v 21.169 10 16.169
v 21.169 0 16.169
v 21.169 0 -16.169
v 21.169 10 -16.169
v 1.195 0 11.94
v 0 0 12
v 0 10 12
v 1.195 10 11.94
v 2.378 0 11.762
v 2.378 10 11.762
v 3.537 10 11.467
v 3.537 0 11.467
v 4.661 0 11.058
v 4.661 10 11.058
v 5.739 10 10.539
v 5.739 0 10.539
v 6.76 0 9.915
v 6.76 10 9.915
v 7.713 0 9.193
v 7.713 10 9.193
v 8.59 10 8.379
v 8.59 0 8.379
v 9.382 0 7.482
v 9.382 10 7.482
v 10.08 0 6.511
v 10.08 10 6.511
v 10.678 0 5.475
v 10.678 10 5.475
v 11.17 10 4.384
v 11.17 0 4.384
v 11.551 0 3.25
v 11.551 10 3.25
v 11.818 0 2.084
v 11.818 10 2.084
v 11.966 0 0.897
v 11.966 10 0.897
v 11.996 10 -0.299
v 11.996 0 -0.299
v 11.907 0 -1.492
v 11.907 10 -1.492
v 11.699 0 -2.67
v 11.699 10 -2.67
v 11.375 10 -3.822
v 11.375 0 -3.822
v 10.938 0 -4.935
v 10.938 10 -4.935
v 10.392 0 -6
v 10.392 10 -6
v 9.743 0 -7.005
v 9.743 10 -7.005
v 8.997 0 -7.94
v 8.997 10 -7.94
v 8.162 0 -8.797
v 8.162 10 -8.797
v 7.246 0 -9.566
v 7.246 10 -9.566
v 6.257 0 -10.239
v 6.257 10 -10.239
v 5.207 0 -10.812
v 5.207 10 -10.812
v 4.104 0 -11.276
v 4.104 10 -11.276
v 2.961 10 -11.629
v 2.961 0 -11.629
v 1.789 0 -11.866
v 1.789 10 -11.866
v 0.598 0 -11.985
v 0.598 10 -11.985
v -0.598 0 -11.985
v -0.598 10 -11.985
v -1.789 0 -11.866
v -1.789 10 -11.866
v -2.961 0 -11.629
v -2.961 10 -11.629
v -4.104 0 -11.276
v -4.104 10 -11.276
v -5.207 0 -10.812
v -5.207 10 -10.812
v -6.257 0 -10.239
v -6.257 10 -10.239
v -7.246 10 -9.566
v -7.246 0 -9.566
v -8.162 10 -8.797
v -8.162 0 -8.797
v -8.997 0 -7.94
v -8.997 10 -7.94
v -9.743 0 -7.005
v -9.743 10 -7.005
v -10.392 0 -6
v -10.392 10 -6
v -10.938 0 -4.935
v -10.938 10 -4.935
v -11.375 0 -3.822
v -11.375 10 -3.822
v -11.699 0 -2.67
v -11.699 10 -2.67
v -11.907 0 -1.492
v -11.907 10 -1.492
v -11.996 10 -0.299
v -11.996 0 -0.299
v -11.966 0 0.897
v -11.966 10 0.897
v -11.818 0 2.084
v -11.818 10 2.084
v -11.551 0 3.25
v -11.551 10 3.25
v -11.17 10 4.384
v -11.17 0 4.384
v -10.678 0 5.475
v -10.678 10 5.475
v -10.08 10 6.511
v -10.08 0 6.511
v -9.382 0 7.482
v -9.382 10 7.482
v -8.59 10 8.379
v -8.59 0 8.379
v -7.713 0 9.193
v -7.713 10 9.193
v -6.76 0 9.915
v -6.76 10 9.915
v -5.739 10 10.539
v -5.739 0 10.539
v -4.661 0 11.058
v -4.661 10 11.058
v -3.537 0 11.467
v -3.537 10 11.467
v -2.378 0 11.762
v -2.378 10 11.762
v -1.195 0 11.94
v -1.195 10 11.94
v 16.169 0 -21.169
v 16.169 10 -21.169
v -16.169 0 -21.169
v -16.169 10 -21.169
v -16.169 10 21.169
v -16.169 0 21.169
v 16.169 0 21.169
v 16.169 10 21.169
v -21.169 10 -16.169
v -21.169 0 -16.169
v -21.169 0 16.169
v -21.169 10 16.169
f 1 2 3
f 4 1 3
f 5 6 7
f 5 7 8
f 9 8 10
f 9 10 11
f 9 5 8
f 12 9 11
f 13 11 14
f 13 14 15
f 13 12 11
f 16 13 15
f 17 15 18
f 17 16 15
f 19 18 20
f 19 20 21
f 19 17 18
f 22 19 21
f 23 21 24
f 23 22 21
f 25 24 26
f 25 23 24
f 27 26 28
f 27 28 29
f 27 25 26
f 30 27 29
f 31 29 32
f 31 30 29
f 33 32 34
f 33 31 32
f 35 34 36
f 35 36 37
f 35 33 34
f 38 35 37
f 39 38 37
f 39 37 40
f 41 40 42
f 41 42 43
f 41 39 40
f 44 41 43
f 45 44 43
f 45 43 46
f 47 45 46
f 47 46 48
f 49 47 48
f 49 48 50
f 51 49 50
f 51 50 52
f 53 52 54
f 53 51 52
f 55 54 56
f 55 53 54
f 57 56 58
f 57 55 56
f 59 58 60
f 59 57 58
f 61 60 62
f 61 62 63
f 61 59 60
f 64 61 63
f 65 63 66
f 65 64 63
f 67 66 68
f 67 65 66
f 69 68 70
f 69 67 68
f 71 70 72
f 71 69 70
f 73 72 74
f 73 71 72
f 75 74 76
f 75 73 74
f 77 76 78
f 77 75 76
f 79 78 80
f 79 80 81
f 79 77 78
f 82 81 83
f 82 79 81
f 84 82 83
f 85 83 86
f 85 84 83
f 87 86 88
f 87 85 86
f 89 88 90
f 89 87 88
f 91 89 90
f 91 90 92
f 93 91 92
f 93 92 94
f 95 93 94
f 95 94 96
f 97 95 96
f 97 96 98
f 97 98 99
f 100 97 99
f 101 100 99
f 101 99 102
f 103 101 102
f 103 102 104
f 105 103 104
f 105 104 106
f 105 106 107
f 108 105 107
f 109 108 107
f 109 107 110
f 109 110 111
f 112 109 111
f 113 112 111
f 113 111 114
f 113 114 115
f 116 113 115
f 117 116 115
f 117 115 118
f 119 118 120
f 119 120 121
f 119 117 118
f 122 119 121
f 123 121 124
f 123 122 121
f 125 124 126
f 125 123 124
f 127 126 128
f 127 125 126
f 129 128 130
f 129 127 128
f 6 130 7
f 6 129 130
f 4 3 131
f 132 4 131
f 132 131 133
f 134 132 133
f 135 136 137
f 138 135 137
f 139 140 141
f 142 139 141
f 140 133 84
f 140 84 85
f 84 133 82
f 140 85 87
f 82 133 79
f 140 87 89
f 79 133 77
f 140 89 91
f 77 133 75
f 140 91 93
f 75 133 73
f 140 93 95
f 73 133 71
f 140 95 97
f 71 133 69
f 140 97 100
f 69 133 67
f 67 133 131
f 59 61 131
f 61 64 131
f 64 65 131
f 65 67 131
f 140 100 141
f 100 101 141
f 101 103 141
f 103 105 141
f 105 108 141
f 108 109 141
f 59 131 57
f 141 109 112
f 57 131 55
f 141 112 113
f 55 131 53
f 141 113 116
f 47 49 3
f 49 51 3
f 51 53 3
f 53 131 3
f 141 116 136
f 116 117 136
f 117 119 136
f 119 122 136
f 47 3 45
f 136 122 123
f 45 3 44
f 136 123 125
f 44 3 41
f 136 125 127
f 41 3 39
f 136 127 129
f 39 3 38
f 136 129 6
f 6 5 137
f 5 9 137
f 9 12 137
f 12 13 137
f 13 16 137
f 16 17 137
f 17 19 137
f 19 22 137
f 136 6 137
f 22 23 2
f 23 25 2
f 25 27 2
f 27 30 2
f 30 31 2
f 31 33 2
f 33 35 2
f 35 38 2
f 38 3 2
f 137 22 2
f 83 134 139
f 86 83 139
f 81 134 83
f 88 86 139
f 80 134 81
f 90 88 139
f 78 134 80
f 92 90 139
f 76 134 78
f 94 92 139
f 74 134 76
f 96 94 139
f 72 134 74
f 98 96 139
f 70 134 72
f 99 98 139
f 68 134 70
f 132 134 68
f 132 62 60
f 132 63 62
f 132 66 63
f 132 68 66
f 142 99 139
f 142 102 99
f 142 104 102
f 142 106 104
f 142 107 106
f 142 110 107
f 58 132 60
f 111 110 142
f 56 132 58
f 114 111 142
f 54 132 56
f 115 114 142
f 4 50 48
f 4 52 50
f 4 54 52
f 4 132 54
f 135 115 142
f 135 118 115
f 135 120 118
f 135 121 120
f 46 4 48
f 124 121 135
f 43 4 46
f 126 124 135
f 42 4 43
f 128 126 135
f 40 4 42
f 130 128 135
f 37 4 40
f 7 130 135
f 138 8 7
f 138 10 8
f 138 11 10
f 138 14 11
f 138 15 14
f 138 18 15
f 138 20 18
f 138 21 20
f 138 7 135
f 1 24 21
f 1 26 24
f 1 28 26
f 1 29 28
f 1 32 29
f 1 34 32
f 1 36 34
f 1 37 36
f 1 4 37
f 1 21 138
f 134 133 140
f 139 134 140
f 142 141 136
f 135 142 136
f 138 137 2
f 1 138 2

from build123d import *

# Parameters (mm, degrees)
SKETCH1_R          = 33.334829616
SKETCH1_R_2        = 12
EXTRUDE1_DEPTH     = 10
SKETCH2_W          = 68.7469374
SKETCH2_H          = 68.7469374
CUT_EXTRUDE1_DEPTH = 10


with BuildPart() as part:
    # Sketch1 → Extrude1 (new body)
    with BuildSketch(Plane(origin=(0, 0, 0), x_dir=(1, 0, 0), z_dir=(0, 1, 0))):
        with Locations(Location((0, 0, 0), (0, 0, 270))):
            Circle(SKETCH1_R)
        with Locations(Location((0, 0, 0), (0, 0, 270))):
            Circle(SKETCH1_R_2, mode=Mode.SUBTRACT)
    extrude(amount=EXTRUDE1_DEPTH)

    # Sketch2 → Cut-Extrude1 (cut)
    with BuildSketch(Plane.XZ):
        Rectangle(SKETCH2_W, SKETCH2_H)
        Polygon((16.16926222, 21.16926222), (21.16926222, 16.16926222), (21.16926222, -16.16926222), (16.16926222, -21.16926222), (-16.16926222, -21.16926222), (-21.16926222, -16.16926222), (-21.16926222, 16.16926222), (-16.16926222, 21.16926222), align=None, mode=Mode.SUBTRACT)
    extrude(amount=-CUT_EXTRUDE1_DEPTH, mode=Mode.SUBTRACT)


solid = part.part
